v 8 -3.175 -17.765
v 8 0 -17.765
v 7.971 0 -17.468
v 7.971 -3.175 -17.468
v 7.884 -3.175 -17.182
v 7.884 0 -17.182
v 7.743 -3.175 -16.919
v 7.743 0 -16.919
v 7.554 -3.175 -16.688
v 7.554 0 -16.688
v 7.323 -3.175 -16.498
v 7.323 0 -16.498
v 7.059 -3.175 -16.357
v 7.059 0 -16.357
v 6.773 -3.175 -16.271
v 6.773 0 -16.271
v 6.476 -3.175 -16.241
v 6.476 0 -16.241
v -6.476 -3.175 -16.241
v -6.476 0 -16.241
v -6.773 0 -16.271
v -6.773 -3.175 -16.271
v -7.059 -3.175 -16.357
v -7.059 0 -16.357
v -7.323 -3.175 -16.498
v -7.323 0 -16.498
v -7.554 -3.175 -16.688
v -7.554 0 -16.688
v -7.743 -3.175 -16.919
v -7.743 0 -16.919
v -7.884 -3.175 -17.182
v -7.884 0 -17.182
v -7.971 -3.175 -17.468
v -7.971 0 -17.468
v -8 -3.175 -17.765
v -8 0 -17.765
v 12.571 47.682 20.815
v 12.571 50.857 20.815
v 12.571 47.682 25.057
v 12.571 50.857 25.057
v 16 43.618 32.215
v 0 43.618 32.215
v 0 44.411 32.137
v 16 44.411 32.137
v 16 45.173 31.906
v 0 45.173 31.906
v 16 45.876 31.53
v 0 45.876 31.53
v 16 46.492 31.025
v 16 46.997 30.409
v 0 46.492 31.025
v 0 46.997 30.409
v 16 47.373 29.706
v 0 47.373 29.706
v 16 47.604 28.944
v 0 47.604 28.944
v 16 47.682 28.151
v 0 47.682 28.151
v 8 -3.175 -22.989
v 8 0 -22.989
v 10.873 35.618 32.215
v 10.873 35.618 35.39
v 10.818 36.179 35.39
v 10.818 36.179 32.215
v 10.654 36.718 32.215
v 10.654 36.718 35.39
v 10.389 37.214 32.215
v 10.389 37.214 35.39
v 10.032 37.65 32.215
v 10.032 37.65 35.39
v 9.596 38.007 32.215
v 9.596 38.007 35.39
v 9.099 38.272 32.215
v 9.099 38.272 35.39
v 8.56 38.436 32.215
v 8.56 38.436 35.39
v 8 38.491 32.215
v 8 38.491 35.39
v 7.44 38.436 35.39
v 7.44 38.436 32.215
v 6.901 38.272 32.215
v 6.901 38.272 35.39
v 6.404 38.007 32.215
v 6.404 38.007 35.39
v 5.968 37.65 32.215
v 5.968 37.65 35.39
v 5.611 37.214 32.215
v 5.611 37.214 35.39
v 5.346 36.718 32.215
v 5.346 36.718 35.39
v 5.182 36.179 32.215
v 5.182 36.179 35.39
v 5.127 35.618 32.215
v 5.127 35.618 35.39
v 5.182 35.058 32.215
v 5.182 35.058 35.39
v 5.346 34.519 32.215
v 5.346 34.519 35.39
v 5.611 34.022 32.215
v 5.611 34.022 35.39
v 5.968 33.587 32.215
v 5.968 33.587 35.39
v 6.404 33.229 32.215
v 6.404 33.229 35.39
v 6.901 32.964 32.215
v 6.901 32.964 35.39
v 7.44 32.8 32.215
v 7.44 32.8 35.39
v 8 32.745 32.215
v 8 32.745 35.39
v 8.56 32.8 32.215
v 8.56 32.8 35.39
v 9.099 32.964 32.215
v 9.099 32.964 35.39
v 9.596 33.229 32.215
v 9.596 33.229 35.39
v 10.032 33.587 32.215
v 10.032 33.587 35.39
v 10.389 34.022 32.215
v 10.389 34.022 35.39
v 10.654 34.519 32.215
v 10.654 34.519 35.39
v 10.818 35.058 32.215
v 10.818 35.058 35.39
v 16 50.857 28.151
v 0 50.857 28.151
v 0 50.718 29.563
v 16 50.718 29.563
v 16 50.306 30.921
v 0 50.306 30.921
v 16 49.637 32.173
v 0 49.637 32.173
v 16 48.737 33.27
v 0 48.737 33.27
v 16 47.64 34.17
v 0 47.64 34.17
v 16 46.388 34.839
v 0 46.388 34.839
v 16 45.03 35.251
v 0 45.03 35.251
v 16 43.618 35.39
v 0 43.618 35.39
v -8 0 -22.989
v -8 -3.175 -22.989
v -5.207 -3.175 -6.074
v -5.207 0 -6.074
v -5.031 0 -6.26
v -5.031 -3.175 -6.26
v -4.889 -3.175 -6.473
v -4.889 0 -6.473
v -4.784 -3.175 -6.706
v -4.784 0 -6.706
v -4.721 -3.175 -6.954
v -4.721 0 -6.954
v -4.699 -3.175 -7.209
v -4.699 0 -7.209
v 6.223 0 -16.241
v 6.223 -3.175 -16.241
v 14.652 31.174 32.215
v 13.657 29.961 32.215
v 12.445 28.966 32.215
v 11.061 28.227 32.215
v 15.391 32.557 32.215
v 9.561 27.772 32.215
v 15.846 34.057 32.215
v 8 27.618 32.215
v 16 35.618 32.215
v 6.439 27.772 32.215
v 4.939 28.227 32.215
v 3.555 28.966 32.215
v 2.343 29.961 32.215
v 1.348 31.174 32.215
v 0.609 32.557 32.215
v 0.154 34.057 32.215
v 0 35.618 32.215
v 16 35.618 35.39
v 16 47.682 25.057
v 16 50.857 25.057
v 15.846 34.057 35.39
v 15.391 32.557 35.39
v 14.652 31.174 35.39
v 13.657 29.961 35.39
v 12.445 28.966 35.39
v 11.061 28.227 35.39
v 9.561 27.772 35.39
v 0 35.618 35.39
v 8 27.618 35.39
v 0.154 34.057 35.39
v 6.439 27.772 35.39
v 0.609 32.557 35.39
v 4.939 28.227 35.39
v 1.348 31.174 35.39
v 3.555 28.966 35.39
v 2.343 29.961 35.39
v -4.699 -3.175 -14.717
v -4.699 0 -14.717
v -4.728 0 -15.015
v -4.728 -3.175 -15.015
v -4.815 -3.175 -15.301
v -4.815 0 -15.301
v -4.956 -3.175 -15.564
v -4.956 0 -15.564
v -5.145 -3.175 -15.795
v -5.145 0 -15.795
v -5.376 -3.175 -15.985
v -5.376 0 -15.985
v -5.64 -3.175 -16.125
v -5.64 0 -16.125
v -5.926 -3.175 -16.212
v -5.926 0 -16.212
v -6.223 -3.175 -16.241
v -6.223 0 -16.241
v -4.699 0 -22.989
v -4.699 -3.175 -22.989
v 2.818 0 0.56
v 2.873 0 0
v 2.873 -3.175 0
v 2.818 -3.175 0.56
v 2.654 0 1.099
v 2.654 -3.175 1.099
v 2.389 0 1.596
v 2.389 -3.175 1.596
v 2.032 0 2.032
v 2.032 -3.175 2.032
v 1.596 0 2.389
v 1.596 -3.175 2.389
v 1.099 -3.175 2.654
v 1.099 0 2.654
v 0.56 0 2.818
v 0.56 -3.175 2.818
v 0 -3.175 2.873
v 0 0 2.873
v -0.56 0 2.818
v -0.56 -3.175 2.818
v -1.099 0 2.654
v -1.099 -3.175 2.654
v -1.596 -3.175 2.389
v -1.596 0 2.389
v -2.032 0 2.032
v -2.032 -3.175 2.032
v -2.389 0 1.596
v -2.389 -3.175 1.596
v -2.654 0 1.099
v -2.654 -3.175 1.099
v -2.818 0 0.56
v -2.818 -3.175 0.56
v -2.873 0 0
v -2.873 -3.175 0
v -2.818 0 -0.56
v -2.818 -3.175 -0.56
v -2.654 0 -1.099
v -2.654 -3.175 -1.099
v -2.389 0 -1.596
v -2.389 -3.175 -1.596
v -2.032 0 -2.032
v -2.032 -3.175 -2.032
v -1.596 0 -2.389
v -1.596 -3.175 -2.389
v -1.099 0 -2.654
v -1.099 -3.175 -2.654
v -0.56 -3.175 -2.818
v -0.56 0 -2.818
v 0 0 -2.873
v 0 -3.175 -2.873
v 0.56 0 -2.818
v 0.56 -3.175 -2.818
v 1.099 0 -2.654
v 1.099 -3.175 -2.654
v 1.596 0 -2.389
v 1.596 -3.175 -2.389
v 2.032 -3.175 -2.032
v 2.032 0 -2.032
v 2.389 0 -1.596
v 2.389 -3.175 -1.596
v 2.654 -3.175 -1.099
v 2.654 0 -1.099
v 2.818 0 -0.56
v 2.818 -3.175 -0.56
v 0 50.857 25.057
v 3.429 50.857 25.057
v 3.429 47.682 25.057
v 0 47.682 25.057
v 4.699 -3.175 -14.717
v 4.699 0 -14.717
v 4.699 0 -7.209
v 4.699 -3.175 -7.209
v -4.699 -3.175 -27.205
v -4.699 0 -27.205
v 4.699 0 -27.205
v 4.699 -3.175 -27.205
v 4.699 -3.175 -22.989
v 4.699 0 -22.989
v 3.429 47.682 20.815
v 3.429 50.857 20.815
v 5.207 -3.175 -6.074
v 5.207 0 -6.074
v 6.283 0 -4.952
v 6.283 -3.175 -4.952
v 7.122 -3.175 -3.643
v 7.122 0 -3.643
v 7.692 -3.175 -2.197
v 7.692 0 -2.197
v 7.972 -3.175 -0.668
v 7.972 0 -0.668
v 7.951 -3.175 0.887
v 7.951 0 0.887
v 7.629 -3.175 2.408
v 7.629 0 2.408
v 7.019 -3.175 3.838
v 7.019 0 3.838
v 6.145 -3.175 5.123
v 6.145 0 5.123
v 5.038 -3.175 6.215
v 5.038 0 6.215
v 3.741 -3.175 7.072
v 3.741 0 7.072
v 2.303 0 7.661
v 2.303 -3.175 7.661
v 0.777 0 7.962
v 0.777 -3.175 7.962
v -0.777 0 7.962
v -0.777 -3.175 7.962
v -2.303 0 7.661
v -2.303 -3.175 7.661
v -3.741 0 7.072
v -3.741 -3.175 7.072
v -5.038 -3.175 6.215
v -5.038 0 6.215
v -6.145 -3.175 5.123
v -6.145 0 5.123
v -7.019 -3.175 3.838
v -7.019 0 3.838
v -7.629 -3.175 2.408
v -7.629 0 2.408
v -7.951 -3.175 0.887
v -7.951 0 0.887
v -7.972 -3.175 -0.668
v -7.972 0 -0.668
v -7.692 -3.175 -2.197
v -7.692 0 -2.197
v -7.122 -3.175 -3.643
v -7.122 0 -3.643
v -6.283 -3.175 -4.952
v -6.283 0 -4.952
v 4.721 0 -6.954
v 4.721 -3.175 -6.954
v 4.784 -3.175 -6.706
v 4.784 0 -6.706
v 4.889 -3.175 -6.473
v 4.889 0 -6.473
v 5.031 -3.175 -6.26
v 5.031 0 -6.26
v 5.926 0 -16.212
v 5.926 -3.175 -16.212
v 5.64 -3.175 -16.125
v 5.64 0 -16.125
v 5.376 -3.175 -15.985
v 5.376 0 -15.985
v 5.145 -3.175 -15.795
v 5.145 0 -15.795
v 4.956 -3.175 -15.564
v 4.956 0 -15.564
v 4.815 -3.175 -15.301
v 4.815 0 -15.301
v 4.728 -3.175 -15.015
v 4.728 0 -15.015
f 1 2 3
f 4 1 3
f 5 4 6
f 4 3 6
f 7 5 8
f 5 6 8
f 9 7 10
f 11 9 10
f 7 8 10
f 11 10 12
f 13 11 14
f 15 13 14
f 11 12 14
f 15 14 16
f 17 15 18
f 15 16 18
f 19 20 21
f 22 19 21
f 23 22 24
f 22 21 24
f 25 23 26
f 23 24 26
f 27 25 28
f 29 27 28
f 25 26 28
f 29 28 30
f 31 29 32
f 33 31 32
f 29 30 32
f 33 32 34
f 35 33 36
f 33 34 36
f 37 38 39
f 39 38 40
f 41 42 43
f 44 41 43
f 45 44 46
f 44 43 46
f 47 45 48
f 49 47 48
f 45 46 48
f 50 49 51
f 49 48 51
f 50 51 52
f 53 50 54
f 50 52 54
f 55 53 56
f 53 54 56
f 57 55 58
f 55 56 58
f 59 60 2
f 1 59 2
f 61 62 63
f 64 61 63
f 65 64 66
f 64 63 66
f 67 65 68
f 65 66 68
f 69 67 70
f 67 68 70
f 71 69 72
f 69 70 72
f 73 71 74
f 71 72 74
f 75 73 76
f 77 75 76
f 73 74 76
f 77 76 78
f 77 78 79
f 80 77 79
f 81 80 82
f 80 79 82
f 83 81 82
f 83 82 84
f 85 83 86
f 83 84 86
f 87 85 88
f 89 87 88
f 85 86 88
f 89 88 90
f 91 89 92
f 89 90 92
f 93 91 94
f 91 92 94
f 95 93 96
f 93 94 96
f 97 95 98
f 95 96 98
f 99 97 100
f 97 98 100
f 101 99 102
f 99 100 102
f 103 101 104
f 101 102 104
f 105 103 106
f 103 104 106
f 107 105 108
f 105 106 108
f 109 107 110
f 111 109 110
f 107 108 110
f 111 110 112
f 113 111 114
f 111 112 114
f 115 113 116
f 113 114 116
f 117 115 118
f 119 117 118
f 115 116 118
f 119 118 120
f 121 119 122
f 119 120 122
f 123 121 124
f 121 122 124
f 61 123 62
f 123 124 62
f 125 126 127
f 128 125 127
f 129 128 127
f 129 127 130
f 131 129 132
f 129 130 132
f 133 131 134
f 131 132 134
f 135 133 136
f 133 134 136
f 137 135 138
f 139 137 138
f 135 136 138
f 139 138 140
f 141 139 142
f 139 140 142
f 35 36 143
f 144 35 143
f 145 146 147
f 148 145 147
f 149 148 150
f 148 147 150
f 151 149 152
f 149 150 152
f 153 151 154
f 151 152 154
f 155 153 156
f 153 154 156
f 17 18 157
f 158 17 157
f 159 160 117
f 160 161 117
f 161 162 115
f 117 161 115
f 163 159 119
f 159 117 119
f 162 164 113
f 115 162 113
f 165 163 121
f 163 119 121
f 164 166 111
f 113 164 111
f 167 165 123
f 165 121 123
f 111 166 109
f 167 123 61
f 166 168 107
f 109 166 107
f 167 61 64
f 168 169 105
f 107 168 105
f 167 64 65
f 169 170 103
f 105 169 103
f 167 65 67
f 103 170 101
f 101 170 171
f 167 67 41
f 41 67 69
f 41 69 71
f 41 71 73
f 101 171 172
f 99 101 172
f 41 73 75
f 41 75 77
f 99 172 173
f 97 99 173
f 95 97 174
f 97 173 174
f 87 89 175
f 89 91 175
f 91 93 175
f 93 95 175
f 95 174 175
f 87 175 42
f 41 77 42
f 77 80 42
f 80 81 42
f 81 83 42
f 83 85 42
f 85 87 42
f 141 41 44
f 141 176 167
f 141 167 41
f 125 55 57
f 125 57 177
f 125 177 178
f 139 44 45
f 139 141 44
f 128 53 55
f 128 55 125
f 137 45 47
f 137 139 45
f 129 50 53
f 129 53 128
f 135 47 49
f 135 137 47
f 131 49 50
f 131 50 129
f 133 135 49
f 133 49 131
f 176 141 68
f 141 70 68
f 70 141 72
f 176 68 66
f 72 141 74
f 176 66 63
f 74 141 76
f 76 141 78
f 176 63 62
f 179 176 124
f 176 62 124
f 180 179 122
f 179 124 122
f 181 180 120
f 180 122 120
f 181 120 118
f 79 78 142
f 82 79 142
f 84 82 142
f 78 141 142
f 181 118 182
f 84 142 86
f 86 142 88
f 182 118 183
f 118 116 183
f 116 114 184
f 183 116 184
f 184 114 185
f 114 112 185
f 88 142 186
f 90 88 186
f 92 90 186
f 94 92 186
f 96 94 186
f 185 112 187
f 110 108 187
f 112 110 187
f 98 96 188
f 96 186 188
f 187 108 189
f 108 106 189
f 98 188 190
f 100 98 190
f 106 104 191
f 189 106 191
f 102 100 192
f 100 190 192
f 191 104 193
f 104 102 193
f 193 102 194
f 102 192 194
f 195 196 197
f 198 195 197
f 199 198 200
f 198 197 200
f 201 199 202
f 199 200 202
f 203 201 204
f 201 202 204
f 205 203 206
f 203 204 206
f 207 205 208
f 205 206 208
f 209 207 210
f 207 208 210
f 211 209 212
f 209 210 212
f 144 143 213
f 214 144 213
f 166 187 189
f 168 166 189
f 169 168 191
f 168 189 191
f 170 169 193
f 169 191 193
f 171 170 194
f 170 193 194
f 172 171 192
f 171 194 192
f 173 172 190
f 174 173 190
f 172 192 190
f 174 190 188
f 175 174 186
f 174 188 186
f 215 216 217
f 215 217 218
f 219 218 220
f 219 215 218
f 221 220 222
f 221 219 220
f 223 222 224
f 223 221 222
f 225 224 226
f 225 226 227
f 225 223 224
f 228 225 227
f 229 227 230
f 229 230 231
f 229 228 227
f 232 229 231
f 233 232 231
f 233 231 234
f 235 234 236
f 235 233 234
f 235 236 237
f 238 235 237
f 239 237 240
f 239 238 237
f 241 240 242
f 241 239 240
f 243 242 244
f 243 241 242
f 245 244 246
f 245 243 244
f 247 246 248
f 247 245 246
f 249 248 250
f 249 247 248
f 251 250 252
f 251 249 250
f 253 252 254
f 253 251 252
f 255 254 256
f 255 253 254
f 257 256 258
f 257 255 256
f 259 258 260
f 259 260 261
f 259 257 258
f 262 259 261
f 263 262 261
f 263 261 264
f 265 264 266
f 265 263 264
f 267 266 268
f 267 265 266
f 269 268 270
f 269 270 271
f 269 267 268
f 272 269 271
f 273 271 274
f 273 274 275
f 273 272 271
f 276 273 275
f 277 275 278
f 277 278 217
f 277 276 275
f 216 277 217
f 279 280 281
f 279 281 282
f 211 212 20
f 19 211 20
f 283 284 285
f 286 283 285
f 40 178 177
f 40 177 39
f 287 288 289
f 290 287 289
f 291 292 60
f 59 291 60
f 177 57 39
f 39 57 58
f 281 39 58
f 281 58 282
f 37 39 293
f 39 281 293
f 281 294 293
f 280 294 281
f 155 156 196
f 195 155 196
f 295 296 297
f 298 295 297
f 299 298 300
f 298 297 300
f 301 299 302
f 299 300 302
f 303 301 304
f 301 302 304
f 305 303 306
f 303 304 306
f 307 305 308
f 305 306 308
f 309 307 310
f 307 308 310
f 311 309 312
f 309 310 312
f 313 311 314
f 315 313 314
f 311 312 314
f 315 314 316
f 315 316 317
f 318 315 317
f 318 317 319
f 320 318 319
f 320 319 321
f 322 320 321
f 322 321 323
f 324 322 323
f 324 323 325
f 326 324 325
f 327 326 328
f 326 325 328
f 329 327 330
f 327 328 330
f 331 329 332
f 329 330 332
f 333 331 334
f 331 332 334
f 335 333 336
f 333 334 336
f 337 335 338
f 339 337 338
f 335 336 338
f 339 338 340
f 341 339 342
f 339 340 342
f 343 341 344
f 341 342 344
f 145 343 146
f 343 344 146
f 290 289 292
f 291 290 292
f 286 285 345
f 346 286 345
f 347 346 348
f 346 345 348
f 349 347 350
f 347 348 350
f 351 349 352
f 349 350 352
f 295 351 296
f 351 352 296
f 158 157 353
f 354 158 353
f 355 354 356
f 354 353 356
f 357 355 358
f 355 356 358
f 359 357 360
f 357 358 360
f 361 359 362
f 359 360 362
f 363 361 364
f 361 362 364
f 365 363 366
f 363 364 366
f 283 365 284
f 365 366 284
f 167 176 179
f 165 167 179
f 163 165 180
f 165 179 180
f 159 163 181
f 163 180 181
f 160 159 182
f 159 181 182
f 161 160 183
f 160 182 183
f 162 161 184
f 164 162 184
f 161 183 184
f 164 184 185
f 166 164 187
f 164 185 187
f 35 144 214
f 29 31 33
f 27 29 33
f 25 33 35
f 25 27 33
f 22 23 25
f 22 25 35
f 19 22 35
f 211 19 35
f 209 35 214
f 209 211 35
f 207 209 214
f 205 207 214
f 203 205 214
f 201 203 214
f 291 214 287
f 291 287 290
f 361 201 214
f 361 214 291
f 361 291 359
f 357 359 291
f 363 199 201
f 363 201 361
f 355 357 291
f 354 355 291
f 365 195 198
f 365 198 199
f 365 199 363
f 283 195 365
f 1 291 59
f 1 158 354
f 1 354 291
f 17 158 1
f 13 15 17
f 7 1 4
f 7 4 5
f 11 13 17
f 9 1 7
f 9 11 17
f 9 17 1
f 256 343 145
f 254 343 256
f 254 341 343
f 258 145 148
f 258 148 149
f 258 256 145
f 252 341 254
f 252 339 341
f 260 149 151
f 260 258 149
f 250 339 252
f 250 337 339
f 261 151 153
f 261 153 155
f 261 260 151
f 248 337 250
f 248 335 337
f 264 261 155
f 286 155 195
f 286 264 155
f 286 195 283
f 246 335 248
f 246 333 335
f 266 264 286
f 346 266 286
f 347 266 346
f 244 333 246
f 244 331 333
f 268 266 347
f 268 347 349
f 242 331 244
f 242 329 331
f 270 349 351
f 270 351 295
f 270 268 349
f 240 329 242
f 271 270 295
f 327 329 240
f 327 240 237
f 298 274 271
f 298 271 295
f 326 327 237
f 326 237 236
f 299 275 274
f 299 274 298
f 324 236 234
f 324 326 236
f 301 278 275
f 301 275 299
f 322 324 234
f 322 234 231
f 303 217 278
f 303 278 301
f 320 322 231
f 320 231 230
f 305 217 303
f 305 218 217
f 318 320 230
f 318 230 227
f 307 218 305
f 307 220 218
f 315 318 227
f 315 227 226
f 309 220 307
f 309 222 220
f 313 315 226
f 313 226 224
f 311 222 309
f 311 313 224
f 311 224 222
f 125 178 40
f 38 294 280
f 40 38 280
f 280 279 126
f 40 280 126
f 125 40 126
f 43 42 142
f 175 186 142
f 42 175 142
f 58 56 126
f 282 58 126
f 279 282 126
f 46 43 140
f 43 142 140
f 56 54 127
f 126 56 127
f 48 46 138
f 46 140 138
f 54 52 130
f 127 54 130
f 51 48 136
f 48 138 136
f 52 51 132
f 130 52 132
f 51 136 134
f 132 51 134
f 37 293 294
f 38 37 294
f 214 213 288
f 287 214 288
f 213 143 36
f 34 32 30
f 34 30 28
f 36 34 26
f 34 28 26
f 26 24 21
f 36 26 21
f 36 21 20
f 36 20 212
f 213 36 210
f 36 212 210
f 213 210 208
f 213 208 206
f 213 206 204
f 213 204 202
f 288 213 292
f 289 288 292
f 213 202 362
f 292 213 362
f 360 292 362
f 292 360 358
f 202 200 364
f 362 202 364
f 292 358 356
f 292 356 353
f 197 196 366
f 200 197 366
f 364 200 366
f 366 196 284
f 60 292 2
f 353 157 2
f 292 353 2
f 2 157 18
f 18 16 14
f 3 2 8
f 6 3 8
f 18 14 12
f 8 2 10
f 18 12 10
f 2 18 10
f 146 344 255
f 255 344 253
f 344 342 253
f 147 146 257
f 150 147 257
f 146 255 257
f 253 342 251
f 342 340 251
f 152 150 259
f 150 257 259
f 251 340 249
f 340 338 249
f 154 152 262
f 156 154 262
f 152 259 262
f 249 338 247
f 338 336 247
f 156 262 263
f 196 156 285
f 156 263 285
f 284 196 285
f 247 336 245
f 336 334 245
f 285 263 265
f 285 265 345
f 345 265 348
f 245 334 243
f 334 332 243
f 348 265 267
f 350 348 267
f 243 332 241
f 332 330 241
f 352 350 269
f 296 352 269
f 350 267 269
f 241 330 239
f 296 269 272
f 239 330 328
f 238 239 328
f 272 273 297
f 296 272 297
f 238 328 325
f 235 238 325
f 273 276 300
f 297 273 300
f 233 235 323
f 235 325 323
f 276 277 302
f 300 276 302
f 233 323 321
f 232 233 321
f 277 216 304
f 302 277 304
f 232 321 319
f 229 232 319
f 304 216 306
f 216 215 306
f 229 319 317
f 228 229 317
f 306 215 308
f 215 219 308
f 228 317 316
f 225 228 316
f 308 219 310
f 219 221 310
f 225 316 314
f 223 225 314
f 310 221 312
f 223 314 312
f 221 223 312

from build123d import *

# Parameters (mm, degrees)
F0_R     = 2.873
F1_DEPTH = 3.175
F3_DEPTH = 16
F4_W     = 3.429
F4_H     = 4.2418
F5_DEPTH = 25.4
F6_R     = 2.873
F7_DEPTH = 3.175


with BuildPart() as f1:
    # F0 (on Front) → F1 (new body)
    with BuildSketch(Plane.XZ):
        with BuildLine():
            ThreePointArc((-5.2068974255, -6.0735672549), (-4.831756613, -6.587290456), (-4.699, -7.2093980338))
            Line((-4.699, -7.2093980338), (-4.699, -14.7173892691))
            ThreePointArc((-4.699, -14.7173892691), (-5.1453692655, -15.7950200036), (-6.223, -16.2413892691))
            Line((-6.223, -16.2413892691), (-6.476, -16.2413892691))
            ThreePointArc((-6.476, -16.2413892691), (-7.5536307345, -16.6877585345), (-8, -17.7653892691))
            Line((-8, -17.7653892691), (-8, -22.9887201977))
            Line((-8, -22.9887201977), (-4.699, -22.9887201977))
            Line((-4.699, -22.9887201977), (-4.699, -27.2051201977))
            Line((-4.699, -27.2051201977), (0, -27.2051201977))
            Line((0, -27.2051201977), (4.699, -27.2051201977))
            Line((4.699, -27.2051201977), (4.699, -22.9887201977))
            Line((4.699, -22.9887201977), (8, -22.9887201977))
            Line((8, -22.9887201977), (8, -17.7653892691))
            ThreePointArc((8, -17.7653892691), (7.5536307345, -16.6877585345), (6.476, -16.2413892691))
            Line((6.476, -16.2413892691), (6.223, -16.2413892691))
            ThreePointArc((6.223, -16.2413892691), (5.1453692655, -15.7950200036), (4.699, -14.7173892691))
            Line((4.699, -14.7173892691), (4.699, -7.2093980338))
            ThreePointArc((4.699, -7.2093980338), (4.831756613, -6.587290456), (5.2068974255, -6.0735672549))
            ThreePointArc((5.2068974255, -6.0735672549), (0, 8), (-5.2068974255, -6.0735672549))
        make_face()
        Circle(F0_R, mode=Mode.SUBTRACT)
    extrude(amount=F1_DEPTH)


with BuildPart() as f3:
    # F2 (on Right) → F3 (new body)
    with BuildSketch(Plane.YZ):
        with BuildLine():
            Line((47.6821554806, 20.8151274502), (50.8571554806, 20.8151274502))
            Line((50.8571554806, 20.8151274502), (50.8571554806, 28.1511274502))
            ThreePointArc((50.8571554806, 28.1511274502), (48.7369014696, 33.2698734392), (43.6181554806, 35.3901274502))
            Line((43.6181554806, 35.3901274502), (27.6181554806, 35.3901274502))
            Line((27.6181554806, 35.3901274502), (27.6181554806, 32.2151274502))
            Line((27.6181554806, 32.2151274502), (43.6181554806, 32.2151274502))
            ThreePointArc((43.6181554806, 32.2151274502), (46.4918374394, 31.024809409), (47.6821554806, 28.1511274502))
            Line((47.6821554806, 28.1511274502), (47.6821554806, 20.8151274502))
        make_face()
    extrude(amount=F3_DEPTH)

    # F4 (on face) → F5 (cut)
    with BuildSketch(Plane(origin=(0, 50.8571554806, 0), x_dir=(-1, 0, 0), z_dir=(0, 1, 0))):
        with Locations((-14.2855, 22.9360274502)):
            Rectangle(F4_W, F4_H)
        with Locations((-1.7145, 22.9360274502)):
            Rectangle(F4_W, F4_H)
    extrude(amount=-F5_DEPTH, mode=Mode.SUBTRACT)

    # F6 (on face) → F7 (cut, through all)
    with BuildSketch(Plane.XY.offset(35.3901274502)):
        with BuildLine():
            Line((0, 27.6181554806), (8, 27.6181554806))
            ThreePointArc((8, 27.6181554806), (2.3431457505, 29.9613012311), (0, 35.6181554806))
            Line((0, 35.6181554806), (0, 27.6181554806))
        make_face()
        with BuildLine():
            Line((16, 27.6181554806), (16, 35.6181554806))
            ThreePointArc((16, 35.6181554806), (13.6568542495, 29.9613012311), (8, 27.6181554806))
            Line((8, 27.6181554806), (16, 27.6181554806))
        make_face()
        with Locations((8, 35.6181554806)):
            Circle(F6_R)
    extrude(amount=-F7_DEPTH, mode=Mode.SUBTRACT)


solid = Compound([f1.part, f3.part])
